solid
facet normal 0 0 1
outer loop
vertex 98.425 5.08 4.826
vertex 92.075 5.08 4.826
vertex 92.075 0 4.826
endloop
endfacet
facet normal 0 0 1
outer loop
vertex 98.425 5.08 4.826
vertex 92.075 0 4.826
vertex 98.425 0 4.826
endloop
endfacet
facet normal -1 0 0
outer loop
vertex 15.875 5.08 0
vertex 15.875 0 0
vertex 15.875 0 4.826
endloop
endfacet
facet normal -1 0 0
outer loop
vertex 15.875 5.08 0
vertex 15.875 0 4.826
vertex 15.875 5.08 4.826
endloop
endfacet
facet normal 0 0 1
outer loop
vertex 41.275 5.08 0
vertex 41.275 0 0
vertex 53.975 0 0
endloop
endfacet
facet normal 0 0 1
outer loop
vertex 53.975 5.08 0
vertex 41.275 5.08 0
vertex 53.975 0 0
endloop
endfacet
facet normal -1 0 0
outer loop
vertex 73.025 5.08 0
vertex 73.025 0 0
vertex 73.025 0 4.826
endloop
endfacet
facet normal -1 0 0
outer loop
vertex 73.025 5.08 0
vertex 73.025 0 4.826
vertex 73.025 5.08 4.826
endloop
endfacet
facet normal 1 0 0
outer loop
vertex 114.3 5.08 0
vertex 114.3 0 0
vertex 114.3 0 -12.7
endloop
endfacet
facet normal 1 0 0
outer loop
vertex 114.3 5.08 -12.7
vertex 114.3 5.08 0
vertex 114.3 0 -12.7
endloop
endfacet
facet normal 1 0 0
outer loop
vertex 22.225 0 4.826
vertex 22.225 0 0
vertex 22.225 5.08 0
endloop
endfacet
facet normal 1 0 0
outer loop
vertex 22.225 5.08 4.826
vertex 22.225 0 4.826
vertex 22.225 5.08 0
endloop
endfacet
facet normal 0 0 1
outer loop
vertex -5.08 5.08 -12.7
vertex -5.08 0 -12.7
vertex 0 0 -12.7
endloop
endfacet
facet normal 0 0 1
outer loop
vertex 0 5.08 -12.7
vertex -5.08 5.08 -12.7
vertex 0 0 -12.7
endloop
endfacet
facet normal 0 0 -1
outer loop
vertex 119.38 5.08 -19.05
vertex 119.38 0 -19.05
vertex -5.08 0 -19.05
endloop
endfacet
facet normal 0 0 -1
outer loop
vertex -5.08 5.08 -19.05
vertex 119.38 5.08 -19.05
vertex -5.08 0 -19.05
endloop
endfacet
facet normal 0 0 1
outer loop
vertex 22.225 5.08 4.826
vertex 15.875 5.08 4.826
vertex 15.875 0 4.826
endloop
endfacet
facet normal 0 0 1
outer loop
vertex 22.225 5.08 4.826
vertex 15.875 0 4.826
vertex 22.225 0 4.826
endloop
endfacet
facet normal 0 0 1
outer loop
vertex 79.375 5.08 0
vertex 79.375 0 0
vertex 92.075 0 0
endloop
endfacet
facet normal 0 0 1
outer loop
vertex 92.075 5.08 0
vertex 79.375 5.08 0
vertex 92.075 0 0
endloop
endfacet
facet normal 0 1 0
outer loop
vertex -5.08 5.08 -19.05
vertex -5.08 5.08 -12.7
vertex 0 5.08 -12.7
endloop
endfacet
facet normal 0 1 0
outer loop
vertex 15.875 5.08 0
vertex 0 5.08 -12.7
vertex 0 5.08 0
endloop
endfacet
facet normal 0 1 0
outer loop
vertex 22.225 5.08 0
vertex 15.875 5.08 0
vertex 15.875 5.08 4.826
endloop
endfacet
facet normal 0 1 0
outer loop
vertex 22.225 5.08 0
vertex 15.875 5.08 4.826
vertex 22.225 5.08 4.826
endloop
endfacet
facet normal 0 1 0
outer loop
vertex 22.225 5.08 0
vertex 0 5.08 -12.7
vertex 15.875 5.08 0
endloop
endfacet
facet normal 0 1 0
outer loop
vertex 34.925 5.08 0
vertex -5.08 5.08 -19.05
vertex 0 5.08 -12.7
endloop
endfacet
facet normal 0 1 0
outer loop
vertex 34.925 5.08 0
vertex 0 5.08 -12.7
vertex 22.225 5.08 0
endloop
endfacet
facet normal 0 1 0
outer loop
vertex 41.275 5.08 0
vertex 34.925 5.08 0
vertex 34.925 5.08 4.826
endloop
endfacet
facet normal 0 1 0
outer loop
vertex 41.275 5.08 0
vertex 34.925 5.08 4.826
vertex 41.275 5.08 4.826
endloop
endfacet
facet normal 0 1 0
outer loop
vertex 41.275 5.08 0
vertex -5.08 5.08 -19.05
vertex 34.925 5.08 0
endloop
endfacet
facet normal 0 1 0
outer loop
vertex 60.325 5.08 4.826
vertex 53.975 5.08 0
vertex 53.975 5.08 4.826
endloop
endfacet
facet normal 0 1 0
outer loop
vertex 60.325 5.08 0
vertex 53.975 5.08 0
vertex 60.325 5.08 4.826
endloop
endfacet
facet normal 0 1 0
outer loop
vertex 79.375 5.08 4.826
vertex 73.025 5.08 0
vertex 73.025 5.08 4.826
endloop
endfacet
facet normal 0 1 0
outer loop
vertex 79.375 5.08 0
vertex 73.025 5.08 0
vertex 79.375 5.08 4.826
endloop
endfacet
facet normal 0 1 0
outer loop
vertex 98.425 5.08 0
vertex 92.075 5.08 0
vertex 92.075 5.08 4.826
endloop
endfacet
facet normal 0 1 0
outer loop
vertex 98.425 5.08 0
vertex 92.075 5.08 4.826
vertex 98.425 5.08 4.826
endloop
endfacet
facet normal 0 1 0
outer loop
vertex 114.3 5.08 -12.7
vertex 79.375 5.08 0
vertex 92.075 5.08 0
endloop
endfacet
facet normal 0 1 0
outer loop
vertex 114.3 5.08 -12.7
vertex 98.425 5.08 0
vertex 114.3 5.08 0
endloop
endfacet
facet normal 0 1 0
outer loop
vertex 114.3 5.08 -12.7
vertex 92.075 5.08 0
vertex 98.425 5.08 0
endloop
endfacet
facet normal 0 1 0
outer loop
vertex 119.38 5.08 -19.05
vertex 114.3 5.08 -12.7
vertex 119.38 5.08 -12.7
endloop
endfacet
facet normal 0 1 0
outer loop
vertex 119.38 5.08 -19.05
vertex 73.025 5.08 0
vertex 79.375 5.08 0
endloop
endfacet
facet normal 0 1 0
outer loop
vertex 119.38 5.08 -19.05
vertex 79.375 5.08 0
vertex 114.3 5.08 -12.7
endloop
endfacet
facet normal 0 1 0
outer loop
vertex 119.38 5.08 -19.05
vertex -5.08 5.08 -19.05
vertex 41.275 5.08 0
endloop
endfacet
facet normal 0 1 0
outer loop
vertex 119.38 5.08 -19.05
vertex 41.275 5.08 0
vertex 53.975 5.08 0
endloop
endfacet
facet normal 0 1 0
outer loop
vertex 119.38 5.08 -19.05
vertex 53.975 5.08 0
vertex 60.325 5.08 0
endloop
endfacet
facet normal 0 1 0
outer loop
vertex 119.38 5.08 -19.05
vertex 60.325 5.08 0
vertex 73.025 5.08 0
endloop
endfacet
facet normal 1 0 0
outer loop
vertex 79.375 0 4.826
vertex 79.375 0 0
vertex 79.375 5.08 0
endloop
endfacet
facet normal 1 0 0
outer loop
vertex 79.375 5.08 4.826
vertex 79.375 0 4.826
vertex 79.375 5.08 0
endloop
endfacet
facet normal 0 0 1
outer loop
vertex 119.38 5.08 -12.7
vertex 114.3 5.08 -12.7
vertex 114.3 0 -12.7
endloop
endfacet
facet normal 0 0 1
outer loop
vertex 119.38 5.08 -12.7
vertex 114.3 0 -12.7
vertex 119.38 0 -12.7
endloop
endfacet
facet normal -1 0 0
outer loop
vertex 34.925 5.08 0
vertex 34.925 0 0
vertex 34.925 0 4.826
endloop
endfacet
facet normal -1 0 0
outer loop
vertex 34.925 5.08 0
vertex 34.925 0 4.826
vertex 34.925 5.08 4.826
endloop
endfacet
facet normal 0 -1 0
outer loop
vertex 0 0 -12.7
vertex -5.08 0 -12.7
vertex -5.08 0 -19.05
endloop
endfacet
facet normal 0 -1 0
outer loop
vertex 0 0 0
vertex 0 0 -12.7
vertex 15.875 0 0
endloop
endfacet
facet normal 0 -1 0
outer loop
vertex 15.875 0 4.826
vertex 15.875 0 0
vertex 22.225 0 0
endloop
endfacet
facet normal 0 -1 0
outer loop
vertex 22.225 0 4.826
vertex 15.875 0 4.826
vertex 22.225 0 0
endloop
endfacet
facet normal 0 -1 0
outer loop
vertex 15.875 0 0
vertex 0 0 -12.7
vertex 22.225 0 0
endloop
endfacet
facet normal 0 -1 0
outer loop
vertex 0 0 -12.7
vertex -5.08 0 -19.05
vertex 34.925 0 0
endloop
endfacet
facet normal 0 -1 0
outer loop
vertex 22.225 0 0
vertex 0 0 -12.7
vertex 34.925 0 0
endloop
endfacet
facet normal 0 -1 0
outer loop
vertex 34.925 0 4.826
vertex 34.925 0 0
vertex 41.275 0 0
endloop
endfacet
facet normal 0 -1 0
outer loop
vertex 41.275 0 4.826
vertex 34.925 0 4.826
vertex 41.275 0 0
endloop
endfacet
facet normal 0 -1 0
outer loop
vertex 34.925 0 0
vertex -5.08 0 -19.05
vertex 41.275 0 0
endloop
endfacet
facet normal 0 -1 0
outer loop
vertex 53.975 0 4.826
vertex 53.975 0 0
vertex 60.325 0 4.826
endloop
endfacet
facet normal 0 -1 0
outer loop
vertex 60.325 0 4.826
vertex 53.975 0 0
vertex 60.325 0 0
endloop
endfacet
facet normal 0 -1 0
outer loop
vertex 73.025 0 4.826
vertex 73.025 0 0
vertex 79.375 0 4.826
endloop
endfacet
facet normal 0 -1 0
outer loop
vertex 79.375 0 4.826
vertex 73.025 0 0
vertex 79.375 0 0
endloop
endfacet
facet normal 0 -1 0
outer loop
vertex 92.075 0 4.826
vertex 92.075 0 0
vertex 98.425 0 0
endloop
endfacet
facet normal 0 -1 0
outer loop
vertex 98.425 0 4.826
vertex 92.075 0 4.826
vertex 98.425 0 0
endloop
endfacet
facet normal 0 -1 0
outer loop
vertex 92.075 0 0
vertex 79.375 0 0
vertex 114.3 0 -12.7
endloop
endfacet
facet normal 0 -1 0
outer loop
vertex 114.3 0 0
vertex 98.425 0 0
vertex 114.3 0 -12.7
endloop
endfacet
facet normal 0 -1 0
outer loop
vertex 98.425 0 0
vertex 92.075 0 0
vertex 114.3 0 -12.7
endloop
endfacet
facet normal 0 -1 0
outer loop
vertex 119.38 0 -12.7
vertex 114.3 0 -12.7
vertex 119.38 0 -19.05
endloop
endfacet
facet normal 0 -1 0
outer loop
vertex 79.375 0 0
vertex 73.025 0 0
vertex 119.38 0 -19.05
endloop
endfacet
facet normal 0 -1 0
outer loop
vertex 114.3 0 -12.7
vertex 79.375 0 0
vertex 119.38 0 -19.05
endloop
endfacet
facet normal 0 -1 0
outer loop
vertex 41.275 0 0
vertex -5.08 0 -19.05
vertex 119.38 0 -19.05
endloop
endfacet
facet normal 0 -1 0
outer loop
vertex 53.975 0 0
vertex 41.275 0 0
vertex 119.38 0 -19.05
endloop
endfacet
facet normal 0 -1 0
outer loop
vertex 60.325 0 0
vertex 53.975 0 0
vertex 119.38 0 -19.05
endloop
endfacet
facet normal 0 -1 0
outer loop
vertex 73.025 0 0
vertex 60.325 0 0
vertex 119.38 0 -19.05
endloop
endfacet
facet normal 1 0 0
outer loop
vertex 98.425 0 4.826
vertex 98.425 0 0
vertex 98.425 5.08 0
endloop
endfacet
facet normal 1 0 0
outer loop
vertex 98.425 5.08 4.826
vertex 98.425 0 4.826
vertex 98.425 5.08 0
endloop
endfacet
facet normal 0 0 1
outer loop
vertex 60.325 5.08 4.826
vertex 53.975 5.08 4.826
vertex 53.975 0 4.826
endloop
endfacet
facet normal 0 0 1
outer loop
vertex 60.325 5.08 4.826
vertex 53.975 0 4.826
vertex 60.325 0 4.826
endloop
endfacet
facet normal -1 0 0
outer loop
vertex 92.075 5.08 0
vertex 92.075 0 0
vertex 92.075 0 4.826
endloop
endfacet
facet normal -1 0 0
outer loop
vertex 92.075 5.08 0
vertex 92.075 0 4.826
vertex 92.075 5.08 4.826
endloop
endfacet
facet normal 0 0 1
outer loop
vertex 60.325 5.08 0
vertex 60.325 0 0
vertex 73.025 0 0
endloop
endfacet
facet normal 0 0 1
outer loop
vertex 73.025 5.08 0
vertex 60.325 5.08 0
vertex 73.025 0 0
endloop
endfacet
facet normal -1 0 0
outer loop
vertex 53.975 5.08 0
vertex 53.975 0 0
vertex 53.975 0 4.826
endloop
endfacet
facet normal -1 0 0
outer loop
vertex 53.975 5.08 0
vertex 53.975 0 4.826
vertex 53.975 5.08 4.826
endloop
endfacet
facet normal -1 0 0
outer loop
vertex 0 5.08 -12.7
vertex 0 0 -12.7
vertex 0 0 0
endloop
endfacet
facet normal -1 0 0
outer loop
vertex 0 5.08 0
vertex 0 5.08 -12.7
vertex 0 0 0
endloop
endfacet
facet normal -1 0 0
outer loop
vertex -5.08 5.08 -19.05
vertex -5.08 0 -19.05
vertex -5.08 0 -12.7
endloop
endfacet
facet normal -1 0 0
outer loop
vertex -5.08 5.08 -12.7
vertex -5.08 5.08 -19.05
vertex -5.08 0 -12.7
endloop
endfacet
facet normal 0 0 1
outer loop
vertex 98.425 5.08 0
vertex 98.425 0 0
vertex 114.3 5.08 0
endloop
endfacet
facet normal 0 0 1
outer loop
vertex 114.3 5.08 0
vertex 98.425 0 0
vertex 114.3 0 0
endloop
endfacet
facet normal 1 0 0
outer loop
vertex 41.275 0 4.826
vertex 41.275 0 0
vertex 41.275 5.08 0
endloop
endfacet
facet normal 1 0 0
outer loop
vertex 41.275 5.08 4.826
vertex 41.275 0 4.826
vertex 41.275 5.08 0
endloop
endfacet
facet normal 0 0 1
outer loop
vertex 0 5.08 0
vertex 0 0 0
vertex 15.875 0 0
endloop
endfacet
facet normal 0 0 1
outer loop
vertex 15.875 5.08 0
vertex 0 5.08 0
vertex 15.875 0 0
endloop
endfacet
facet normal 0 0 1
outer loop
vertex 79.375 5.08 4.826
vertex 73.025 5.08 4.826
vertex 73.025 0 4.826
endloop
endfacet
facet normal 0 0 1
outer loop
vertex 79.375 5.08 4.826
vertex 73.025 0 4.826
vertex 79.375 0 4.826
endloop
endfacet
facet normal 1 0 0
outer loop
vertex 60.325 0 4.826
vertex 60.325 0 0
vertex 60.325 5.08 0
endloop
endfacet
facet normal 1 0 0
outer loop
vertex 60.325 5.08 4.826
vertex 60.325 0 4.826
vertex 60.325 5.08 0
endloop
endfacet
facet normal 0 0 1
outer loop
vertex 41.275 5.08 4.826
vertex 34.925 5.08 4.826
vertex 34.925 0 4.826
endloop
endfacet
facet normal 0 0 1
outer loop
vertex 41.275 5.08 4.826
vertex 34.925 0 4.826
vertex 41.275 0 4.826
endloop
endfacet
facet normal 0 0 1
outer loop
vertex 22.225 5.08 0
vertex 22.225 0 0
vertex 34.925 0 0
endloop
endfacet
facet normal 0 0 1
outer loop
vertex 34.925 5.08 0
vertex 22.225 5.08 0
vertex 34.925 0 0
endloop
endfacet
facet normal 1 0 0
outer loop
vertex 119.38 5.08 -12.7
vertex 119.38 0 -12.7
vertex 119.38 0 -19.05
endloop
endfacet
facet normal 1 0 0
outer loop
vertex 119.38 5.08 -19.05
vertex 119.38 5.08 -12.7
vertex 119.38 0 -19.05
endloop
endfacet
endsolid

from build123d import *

# Parameters (mm, degrees)
BOSS_EXTRUDE1_DEPTH = 5.08
SKETCH2_W           = 6.35
SKETCH2_H           = 5.08
BOSS_EXTRUDE2_DEPTH = 4.826
LPATTERN1_COUNT     = 5
LPATTERN1_PITCH     = 19.05


with BuildPart() as part:
    # Sketch1 → Boss-Extrude1 (new body)
    with BuildSketch(Plane(origin=(0, 0, 0), x_dir=(1, 0, 0), z_dir=(0, 1, 0))):
        Polygon((0, 0), (114.3, 0), (114.3, 12.7), (119.38, 12.7), (119.38, 19.05), (114.3, 19.05), (0, 19.05), (-5.08, 19.05), (-5.08, 12.7), (0, 12.7), align=None)
    extrude(amount=BOSS_EXTRUDE1_DEPTH)

    # Sketch2 → Boss-Extrude2 (add)
    with BuildSketch(Plane.XY):
        with Locations((19.05, 2.54)):
            Rectangle(SKETCH2_W, SKETCH2_H)
    boss_extrude2 = extrude(amount=BOSS_EXTRUDE2_DEPTH)

    # LPattern1: Boss-Extrude2 ×5
    with Locations(*[(i * LPATTERN1_PITCH, 0, 0) for i in range(1, LPATTERN1_COUNT)]):
        add(boss_extrude2)


solid = part.part
